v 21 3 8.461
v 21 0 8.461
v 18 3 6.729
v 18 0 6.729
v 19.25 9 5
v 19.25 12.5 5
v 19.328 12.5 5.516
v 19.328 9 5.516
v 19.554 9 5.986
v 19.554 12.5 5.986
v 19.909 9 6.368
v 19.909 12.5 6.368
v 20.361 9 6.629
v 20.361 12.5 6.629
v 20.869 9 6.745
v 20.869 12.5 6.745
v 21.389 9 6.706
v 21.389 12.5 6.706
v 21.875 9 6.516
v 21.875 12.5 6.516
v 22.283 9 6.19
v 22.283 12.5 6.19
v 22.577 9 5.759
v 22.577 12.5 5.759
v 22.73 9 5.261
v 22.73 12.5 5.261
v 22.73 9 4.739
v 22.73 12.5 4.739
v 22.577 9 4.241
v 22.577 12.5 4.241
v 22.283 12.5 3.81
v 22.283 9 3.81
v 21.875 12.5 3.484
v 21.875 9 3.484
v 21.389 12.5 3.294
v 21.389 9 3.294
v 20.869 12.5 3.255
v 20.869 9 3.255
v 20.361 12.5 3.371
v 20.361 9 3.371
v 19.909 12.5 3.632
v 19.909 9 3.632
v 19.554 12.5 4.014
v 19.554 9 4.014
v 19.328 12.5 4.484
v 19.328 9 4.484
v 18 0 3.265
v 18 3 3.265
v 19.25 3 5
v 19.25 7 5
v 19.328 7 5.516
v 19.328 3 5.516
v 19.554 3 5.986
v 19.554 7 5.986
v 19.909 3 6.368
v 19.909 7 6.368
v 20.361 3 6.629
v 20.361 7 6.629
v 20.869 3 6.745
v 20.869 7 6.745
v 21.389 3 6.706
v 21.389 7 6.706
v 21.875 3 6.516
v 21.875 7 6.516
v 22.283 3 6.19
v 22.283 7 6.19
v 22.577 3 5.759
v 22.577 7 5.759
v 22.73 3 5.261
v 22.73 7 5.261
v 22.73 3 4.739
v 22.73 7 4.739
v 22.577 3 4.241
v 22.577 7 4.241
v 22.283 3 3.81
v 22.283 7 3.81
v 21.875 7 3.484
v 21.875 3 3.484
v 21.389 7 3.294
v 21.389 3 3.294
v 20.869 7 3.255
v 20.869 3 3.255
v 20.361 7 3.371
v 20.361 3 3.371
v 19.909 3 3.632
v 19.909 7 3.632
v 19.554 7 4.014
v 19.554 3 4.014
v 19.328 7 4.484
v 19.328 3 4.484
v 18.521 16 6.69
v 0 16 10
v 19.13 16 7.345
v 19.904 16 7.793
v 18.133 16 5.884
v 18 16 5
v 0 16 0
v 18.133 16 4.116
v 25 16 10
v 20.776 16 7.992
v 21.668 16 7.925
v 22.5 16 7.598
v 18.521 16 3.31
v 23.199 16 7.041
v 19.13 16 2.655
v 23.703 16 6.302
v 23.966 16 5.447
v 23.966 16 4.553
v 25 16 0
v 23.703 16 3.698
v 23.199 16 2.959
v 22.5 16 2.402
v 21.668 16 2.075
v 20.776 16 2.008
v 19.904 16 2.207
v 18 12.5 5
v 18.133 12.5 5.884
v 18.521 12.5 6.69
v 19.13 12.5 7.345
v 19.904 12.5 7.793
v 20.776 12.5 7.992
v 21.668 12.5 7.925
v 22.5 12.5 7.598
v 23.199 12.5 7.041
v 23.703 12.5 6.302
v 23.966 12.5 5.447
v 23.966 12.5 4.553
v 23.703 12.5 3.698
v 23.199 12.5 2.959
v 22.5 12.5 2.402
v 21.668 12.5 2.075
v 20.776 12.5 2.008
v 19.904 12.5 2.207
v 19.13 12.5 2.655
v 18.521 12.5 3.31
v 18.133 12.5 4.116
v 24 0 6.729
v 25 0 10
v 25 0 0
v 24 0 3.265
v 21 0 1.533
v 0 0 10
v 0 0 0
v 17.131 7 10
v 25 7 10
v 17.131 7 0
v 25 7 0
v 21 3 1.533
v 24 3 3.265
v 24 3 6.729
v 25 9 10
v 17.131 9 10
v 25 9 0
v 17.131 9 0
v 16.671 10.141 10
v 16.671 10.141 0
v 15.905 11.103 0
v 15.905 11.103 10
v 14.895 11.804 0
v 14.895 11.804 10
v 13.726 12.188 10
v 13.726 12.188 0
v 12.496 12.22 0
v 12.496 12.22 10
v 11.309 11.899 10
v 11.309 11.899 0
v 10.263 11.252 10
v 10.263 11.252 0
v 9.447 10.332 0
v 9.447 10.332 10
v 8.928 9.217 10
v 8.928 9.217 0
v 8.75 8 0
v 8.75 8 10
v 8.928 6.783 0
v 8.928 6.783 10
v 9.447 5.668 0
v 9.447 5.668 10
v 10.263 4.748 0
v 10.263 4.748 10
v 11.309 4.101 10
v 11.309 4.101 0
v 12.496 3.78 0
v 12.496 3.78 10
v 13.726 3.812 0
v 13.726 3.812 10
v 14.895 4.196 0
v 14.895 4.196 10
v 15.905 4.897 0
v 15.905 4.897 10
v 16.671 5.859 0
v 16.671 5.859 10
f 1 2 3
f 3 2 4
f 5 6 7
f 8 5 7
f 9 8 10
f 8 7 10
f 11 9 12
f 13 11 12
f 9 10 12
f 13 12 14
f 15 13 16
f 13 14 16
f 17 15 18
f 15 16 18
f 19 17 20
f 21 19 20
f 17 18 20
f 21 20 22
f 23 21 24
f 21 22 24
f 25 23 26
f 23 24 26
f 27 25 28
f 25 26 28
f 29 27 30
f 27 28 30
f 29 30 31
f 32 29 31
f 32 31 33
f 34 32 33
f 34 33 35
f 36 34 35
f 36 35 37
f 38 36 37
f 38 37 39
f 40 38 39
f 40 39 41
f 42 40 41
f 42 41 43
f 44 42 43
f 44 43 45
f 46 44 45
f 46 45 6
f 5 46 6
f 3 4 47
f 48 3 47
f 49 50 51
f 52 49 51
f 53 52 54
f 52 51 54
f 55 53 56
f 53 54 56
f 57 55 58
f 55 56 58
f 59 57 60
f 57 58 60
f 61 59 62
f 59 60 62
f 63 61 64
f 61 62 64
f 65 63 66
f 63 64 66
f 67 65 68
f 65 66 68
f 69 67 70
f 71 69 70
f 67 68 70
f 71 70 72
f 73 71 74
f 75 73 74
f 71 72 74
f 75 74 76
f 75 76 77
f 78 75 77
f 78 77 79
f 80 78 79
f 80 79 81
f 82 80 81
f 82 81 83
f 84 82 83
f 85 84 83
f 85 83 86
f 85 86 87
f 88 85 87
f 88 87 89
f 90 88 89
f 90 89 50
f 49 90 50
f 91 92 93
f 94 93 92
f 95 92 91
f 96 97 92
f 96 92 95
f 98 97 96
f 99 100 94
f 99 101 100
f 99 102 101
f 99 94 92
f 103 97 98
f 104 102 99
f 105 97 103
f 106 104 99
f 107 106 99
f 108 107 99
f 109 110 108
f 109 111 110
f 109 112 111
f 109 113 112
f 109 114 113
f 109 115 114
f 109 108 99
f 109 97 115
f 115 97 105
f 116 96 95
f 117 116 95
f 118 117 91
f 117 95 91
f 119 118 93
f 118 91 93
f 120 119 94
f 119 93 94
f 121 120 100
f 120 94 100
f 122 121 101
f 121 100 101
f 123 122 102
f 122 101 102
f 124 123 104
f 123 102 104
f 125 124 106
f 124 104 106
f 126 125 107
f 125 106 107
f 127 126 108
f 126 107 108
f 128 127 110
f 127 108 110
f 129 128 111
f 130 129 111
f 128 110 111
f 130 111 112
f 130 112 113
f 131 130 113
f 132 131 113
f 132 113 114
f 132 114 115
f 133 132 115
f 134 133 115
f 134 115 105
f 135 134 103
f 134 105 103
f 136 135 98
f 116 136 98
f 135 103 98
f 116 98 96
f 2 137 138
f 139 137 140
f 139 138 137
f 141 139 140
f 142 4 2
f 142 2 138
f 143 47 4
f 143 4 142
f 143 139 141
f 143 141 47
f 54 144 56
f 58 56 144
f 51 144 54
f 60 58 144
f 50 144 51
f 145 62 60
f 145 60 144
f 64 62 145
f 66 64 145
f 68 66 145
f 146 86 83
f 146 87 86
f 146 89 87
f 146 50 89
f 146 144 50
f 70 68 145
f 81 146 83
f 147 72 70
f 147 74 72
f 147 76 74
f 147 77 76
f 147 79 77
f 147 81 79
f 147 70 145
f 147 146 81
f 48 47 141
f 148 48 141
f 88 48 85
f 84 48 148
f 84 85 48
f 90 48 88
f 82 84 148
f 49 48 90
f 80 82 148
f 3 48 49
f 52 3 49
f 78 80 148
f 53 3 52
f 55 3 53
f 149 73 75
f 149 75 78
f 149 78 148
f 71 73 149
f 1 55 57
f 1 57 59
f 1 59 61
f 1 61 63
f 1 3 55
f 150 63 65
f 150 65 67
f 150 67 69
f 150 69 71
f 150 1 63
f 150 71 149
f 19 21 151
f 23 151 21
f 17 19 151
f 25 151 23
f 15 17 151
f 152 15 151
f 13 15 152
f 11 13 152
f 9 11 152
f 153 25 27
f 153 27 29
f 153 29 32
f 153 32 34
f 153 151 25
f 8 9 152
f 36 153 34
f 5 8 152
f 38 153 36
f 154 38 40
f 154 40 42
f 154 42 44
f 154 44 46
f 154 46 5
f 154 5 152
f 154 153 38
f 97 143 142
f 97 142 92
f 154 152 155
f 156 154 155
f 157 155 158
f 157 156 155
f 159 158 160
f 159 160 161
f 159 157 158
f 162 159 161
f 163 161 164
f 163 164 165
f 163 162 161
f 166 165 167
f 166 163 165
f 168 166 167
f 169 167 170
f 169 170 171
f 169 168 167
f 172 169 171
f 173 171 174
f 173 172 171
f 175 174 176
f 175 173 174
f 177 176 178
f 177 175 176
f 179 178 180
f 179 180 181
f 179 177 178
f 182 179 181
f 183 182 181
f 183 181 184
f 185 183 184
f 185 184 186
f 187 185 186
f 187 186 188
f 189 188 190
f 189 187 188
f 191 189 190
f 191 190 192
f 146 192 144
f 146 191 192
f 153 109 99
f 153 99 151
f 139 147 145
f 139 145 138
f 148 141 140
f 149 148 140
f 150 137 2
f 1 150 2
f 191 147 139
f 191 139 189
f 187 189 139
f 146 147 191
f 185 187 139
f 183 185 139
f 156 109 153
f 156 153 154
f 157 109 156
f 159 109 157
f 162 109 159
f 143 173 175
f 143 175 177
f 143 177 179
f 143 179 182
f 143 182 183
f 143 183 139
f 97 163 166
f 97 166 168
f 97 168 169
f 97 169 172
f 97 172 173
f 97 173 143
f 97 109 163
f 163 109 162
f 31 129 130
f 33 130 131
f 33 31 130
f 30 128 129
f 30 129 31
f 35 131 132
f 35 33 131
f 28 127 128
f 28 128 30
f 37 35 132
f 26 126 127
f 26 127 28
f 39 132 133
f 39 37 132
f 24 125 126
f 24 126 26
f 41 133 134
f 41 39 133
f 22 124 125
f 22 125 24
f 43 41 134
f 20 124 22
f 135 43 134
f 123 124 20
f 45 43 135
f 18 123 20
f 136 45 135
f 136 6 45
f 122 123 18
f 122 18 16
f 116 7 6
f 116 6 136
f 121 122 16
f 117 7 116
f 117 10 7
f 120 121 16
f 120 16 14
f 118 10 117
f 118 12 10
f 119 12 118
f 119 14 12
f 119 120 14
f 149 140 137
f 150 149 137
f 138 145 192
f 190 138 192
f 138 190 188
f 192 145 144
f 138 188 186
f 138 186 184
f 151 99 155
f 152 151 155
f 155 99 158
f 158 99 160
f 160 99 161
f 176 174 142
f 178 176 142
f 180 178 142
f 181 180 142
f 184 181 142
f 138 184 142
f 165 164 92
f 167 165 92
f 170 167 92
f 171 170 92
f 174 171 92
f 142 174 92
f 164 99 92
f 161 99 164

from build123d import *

# Parameters (mm, degrees)
PAD_DEPTH       = 10
SKETCH001_R     = 1.75
POCKET_DEPTH    = 16
SKETCH002_R     = 3
POCKET001_DEPTH = 3.5
POCKET002_DEPTH = 3


with BuildPart() as part:
    # Sketch → Pad (new body)
    with BuildSketch(Plane.XY):
        with BuildLine():
            Line((0, 0), (0, 16))
            Line((0, 16), (25, 16))
            Line((25, 16), (25, 9))
            Line((25, 9), (17.130678, 9))
            ThreePointArc((17.130678, 9), (8.75, 8), (17.130678, 7))
            Line((17.130678, 7), (25, 7))
            Line((25, 7), (25, 0))
            Line((25, 0), (0, 0))
        make_face()
    extrude(amount=PAD_DEPTH)

    # Sketch001 → Pocket (cut)
    with BuildSketch(Plane(origin=(0, 16, 0), x_dir=(-1, 0, 0), z_dir=(0, 1, 0))):
        with Locations((-21, 4.999996)):
            Circle(SKETCH001_R)
    extrude(amount=-POCKET_DEPTH, mode=Mode.SUBTRACT)

    # Sketch002 → Pocket001 (cut)
    with BuildSketch(Plane(origin=(0, 16, 0), x_dir=(-1, 0, 0), z_dir=(0, 1, 0))):
        with Locations((-21, 5)):
            Circle(SKETCH002_R)
    extrude(amount=-POCKET001_DEPTH, mode=Mode.SUBTRACT)

    # Sketch003 → Pocket002 (cut)
    with BuildSketch(Plane.XZ):
        Polygon((20.999999, 8.461405), (18, 6.729354), (18, 3.265252), (21, 1.533202), (24, 3.265253), (24, 6.729355), align=None)
    extrude(amount=-POCKET002_DEPTH, mode=Mode.SUBTRACT)


solid = part.part
